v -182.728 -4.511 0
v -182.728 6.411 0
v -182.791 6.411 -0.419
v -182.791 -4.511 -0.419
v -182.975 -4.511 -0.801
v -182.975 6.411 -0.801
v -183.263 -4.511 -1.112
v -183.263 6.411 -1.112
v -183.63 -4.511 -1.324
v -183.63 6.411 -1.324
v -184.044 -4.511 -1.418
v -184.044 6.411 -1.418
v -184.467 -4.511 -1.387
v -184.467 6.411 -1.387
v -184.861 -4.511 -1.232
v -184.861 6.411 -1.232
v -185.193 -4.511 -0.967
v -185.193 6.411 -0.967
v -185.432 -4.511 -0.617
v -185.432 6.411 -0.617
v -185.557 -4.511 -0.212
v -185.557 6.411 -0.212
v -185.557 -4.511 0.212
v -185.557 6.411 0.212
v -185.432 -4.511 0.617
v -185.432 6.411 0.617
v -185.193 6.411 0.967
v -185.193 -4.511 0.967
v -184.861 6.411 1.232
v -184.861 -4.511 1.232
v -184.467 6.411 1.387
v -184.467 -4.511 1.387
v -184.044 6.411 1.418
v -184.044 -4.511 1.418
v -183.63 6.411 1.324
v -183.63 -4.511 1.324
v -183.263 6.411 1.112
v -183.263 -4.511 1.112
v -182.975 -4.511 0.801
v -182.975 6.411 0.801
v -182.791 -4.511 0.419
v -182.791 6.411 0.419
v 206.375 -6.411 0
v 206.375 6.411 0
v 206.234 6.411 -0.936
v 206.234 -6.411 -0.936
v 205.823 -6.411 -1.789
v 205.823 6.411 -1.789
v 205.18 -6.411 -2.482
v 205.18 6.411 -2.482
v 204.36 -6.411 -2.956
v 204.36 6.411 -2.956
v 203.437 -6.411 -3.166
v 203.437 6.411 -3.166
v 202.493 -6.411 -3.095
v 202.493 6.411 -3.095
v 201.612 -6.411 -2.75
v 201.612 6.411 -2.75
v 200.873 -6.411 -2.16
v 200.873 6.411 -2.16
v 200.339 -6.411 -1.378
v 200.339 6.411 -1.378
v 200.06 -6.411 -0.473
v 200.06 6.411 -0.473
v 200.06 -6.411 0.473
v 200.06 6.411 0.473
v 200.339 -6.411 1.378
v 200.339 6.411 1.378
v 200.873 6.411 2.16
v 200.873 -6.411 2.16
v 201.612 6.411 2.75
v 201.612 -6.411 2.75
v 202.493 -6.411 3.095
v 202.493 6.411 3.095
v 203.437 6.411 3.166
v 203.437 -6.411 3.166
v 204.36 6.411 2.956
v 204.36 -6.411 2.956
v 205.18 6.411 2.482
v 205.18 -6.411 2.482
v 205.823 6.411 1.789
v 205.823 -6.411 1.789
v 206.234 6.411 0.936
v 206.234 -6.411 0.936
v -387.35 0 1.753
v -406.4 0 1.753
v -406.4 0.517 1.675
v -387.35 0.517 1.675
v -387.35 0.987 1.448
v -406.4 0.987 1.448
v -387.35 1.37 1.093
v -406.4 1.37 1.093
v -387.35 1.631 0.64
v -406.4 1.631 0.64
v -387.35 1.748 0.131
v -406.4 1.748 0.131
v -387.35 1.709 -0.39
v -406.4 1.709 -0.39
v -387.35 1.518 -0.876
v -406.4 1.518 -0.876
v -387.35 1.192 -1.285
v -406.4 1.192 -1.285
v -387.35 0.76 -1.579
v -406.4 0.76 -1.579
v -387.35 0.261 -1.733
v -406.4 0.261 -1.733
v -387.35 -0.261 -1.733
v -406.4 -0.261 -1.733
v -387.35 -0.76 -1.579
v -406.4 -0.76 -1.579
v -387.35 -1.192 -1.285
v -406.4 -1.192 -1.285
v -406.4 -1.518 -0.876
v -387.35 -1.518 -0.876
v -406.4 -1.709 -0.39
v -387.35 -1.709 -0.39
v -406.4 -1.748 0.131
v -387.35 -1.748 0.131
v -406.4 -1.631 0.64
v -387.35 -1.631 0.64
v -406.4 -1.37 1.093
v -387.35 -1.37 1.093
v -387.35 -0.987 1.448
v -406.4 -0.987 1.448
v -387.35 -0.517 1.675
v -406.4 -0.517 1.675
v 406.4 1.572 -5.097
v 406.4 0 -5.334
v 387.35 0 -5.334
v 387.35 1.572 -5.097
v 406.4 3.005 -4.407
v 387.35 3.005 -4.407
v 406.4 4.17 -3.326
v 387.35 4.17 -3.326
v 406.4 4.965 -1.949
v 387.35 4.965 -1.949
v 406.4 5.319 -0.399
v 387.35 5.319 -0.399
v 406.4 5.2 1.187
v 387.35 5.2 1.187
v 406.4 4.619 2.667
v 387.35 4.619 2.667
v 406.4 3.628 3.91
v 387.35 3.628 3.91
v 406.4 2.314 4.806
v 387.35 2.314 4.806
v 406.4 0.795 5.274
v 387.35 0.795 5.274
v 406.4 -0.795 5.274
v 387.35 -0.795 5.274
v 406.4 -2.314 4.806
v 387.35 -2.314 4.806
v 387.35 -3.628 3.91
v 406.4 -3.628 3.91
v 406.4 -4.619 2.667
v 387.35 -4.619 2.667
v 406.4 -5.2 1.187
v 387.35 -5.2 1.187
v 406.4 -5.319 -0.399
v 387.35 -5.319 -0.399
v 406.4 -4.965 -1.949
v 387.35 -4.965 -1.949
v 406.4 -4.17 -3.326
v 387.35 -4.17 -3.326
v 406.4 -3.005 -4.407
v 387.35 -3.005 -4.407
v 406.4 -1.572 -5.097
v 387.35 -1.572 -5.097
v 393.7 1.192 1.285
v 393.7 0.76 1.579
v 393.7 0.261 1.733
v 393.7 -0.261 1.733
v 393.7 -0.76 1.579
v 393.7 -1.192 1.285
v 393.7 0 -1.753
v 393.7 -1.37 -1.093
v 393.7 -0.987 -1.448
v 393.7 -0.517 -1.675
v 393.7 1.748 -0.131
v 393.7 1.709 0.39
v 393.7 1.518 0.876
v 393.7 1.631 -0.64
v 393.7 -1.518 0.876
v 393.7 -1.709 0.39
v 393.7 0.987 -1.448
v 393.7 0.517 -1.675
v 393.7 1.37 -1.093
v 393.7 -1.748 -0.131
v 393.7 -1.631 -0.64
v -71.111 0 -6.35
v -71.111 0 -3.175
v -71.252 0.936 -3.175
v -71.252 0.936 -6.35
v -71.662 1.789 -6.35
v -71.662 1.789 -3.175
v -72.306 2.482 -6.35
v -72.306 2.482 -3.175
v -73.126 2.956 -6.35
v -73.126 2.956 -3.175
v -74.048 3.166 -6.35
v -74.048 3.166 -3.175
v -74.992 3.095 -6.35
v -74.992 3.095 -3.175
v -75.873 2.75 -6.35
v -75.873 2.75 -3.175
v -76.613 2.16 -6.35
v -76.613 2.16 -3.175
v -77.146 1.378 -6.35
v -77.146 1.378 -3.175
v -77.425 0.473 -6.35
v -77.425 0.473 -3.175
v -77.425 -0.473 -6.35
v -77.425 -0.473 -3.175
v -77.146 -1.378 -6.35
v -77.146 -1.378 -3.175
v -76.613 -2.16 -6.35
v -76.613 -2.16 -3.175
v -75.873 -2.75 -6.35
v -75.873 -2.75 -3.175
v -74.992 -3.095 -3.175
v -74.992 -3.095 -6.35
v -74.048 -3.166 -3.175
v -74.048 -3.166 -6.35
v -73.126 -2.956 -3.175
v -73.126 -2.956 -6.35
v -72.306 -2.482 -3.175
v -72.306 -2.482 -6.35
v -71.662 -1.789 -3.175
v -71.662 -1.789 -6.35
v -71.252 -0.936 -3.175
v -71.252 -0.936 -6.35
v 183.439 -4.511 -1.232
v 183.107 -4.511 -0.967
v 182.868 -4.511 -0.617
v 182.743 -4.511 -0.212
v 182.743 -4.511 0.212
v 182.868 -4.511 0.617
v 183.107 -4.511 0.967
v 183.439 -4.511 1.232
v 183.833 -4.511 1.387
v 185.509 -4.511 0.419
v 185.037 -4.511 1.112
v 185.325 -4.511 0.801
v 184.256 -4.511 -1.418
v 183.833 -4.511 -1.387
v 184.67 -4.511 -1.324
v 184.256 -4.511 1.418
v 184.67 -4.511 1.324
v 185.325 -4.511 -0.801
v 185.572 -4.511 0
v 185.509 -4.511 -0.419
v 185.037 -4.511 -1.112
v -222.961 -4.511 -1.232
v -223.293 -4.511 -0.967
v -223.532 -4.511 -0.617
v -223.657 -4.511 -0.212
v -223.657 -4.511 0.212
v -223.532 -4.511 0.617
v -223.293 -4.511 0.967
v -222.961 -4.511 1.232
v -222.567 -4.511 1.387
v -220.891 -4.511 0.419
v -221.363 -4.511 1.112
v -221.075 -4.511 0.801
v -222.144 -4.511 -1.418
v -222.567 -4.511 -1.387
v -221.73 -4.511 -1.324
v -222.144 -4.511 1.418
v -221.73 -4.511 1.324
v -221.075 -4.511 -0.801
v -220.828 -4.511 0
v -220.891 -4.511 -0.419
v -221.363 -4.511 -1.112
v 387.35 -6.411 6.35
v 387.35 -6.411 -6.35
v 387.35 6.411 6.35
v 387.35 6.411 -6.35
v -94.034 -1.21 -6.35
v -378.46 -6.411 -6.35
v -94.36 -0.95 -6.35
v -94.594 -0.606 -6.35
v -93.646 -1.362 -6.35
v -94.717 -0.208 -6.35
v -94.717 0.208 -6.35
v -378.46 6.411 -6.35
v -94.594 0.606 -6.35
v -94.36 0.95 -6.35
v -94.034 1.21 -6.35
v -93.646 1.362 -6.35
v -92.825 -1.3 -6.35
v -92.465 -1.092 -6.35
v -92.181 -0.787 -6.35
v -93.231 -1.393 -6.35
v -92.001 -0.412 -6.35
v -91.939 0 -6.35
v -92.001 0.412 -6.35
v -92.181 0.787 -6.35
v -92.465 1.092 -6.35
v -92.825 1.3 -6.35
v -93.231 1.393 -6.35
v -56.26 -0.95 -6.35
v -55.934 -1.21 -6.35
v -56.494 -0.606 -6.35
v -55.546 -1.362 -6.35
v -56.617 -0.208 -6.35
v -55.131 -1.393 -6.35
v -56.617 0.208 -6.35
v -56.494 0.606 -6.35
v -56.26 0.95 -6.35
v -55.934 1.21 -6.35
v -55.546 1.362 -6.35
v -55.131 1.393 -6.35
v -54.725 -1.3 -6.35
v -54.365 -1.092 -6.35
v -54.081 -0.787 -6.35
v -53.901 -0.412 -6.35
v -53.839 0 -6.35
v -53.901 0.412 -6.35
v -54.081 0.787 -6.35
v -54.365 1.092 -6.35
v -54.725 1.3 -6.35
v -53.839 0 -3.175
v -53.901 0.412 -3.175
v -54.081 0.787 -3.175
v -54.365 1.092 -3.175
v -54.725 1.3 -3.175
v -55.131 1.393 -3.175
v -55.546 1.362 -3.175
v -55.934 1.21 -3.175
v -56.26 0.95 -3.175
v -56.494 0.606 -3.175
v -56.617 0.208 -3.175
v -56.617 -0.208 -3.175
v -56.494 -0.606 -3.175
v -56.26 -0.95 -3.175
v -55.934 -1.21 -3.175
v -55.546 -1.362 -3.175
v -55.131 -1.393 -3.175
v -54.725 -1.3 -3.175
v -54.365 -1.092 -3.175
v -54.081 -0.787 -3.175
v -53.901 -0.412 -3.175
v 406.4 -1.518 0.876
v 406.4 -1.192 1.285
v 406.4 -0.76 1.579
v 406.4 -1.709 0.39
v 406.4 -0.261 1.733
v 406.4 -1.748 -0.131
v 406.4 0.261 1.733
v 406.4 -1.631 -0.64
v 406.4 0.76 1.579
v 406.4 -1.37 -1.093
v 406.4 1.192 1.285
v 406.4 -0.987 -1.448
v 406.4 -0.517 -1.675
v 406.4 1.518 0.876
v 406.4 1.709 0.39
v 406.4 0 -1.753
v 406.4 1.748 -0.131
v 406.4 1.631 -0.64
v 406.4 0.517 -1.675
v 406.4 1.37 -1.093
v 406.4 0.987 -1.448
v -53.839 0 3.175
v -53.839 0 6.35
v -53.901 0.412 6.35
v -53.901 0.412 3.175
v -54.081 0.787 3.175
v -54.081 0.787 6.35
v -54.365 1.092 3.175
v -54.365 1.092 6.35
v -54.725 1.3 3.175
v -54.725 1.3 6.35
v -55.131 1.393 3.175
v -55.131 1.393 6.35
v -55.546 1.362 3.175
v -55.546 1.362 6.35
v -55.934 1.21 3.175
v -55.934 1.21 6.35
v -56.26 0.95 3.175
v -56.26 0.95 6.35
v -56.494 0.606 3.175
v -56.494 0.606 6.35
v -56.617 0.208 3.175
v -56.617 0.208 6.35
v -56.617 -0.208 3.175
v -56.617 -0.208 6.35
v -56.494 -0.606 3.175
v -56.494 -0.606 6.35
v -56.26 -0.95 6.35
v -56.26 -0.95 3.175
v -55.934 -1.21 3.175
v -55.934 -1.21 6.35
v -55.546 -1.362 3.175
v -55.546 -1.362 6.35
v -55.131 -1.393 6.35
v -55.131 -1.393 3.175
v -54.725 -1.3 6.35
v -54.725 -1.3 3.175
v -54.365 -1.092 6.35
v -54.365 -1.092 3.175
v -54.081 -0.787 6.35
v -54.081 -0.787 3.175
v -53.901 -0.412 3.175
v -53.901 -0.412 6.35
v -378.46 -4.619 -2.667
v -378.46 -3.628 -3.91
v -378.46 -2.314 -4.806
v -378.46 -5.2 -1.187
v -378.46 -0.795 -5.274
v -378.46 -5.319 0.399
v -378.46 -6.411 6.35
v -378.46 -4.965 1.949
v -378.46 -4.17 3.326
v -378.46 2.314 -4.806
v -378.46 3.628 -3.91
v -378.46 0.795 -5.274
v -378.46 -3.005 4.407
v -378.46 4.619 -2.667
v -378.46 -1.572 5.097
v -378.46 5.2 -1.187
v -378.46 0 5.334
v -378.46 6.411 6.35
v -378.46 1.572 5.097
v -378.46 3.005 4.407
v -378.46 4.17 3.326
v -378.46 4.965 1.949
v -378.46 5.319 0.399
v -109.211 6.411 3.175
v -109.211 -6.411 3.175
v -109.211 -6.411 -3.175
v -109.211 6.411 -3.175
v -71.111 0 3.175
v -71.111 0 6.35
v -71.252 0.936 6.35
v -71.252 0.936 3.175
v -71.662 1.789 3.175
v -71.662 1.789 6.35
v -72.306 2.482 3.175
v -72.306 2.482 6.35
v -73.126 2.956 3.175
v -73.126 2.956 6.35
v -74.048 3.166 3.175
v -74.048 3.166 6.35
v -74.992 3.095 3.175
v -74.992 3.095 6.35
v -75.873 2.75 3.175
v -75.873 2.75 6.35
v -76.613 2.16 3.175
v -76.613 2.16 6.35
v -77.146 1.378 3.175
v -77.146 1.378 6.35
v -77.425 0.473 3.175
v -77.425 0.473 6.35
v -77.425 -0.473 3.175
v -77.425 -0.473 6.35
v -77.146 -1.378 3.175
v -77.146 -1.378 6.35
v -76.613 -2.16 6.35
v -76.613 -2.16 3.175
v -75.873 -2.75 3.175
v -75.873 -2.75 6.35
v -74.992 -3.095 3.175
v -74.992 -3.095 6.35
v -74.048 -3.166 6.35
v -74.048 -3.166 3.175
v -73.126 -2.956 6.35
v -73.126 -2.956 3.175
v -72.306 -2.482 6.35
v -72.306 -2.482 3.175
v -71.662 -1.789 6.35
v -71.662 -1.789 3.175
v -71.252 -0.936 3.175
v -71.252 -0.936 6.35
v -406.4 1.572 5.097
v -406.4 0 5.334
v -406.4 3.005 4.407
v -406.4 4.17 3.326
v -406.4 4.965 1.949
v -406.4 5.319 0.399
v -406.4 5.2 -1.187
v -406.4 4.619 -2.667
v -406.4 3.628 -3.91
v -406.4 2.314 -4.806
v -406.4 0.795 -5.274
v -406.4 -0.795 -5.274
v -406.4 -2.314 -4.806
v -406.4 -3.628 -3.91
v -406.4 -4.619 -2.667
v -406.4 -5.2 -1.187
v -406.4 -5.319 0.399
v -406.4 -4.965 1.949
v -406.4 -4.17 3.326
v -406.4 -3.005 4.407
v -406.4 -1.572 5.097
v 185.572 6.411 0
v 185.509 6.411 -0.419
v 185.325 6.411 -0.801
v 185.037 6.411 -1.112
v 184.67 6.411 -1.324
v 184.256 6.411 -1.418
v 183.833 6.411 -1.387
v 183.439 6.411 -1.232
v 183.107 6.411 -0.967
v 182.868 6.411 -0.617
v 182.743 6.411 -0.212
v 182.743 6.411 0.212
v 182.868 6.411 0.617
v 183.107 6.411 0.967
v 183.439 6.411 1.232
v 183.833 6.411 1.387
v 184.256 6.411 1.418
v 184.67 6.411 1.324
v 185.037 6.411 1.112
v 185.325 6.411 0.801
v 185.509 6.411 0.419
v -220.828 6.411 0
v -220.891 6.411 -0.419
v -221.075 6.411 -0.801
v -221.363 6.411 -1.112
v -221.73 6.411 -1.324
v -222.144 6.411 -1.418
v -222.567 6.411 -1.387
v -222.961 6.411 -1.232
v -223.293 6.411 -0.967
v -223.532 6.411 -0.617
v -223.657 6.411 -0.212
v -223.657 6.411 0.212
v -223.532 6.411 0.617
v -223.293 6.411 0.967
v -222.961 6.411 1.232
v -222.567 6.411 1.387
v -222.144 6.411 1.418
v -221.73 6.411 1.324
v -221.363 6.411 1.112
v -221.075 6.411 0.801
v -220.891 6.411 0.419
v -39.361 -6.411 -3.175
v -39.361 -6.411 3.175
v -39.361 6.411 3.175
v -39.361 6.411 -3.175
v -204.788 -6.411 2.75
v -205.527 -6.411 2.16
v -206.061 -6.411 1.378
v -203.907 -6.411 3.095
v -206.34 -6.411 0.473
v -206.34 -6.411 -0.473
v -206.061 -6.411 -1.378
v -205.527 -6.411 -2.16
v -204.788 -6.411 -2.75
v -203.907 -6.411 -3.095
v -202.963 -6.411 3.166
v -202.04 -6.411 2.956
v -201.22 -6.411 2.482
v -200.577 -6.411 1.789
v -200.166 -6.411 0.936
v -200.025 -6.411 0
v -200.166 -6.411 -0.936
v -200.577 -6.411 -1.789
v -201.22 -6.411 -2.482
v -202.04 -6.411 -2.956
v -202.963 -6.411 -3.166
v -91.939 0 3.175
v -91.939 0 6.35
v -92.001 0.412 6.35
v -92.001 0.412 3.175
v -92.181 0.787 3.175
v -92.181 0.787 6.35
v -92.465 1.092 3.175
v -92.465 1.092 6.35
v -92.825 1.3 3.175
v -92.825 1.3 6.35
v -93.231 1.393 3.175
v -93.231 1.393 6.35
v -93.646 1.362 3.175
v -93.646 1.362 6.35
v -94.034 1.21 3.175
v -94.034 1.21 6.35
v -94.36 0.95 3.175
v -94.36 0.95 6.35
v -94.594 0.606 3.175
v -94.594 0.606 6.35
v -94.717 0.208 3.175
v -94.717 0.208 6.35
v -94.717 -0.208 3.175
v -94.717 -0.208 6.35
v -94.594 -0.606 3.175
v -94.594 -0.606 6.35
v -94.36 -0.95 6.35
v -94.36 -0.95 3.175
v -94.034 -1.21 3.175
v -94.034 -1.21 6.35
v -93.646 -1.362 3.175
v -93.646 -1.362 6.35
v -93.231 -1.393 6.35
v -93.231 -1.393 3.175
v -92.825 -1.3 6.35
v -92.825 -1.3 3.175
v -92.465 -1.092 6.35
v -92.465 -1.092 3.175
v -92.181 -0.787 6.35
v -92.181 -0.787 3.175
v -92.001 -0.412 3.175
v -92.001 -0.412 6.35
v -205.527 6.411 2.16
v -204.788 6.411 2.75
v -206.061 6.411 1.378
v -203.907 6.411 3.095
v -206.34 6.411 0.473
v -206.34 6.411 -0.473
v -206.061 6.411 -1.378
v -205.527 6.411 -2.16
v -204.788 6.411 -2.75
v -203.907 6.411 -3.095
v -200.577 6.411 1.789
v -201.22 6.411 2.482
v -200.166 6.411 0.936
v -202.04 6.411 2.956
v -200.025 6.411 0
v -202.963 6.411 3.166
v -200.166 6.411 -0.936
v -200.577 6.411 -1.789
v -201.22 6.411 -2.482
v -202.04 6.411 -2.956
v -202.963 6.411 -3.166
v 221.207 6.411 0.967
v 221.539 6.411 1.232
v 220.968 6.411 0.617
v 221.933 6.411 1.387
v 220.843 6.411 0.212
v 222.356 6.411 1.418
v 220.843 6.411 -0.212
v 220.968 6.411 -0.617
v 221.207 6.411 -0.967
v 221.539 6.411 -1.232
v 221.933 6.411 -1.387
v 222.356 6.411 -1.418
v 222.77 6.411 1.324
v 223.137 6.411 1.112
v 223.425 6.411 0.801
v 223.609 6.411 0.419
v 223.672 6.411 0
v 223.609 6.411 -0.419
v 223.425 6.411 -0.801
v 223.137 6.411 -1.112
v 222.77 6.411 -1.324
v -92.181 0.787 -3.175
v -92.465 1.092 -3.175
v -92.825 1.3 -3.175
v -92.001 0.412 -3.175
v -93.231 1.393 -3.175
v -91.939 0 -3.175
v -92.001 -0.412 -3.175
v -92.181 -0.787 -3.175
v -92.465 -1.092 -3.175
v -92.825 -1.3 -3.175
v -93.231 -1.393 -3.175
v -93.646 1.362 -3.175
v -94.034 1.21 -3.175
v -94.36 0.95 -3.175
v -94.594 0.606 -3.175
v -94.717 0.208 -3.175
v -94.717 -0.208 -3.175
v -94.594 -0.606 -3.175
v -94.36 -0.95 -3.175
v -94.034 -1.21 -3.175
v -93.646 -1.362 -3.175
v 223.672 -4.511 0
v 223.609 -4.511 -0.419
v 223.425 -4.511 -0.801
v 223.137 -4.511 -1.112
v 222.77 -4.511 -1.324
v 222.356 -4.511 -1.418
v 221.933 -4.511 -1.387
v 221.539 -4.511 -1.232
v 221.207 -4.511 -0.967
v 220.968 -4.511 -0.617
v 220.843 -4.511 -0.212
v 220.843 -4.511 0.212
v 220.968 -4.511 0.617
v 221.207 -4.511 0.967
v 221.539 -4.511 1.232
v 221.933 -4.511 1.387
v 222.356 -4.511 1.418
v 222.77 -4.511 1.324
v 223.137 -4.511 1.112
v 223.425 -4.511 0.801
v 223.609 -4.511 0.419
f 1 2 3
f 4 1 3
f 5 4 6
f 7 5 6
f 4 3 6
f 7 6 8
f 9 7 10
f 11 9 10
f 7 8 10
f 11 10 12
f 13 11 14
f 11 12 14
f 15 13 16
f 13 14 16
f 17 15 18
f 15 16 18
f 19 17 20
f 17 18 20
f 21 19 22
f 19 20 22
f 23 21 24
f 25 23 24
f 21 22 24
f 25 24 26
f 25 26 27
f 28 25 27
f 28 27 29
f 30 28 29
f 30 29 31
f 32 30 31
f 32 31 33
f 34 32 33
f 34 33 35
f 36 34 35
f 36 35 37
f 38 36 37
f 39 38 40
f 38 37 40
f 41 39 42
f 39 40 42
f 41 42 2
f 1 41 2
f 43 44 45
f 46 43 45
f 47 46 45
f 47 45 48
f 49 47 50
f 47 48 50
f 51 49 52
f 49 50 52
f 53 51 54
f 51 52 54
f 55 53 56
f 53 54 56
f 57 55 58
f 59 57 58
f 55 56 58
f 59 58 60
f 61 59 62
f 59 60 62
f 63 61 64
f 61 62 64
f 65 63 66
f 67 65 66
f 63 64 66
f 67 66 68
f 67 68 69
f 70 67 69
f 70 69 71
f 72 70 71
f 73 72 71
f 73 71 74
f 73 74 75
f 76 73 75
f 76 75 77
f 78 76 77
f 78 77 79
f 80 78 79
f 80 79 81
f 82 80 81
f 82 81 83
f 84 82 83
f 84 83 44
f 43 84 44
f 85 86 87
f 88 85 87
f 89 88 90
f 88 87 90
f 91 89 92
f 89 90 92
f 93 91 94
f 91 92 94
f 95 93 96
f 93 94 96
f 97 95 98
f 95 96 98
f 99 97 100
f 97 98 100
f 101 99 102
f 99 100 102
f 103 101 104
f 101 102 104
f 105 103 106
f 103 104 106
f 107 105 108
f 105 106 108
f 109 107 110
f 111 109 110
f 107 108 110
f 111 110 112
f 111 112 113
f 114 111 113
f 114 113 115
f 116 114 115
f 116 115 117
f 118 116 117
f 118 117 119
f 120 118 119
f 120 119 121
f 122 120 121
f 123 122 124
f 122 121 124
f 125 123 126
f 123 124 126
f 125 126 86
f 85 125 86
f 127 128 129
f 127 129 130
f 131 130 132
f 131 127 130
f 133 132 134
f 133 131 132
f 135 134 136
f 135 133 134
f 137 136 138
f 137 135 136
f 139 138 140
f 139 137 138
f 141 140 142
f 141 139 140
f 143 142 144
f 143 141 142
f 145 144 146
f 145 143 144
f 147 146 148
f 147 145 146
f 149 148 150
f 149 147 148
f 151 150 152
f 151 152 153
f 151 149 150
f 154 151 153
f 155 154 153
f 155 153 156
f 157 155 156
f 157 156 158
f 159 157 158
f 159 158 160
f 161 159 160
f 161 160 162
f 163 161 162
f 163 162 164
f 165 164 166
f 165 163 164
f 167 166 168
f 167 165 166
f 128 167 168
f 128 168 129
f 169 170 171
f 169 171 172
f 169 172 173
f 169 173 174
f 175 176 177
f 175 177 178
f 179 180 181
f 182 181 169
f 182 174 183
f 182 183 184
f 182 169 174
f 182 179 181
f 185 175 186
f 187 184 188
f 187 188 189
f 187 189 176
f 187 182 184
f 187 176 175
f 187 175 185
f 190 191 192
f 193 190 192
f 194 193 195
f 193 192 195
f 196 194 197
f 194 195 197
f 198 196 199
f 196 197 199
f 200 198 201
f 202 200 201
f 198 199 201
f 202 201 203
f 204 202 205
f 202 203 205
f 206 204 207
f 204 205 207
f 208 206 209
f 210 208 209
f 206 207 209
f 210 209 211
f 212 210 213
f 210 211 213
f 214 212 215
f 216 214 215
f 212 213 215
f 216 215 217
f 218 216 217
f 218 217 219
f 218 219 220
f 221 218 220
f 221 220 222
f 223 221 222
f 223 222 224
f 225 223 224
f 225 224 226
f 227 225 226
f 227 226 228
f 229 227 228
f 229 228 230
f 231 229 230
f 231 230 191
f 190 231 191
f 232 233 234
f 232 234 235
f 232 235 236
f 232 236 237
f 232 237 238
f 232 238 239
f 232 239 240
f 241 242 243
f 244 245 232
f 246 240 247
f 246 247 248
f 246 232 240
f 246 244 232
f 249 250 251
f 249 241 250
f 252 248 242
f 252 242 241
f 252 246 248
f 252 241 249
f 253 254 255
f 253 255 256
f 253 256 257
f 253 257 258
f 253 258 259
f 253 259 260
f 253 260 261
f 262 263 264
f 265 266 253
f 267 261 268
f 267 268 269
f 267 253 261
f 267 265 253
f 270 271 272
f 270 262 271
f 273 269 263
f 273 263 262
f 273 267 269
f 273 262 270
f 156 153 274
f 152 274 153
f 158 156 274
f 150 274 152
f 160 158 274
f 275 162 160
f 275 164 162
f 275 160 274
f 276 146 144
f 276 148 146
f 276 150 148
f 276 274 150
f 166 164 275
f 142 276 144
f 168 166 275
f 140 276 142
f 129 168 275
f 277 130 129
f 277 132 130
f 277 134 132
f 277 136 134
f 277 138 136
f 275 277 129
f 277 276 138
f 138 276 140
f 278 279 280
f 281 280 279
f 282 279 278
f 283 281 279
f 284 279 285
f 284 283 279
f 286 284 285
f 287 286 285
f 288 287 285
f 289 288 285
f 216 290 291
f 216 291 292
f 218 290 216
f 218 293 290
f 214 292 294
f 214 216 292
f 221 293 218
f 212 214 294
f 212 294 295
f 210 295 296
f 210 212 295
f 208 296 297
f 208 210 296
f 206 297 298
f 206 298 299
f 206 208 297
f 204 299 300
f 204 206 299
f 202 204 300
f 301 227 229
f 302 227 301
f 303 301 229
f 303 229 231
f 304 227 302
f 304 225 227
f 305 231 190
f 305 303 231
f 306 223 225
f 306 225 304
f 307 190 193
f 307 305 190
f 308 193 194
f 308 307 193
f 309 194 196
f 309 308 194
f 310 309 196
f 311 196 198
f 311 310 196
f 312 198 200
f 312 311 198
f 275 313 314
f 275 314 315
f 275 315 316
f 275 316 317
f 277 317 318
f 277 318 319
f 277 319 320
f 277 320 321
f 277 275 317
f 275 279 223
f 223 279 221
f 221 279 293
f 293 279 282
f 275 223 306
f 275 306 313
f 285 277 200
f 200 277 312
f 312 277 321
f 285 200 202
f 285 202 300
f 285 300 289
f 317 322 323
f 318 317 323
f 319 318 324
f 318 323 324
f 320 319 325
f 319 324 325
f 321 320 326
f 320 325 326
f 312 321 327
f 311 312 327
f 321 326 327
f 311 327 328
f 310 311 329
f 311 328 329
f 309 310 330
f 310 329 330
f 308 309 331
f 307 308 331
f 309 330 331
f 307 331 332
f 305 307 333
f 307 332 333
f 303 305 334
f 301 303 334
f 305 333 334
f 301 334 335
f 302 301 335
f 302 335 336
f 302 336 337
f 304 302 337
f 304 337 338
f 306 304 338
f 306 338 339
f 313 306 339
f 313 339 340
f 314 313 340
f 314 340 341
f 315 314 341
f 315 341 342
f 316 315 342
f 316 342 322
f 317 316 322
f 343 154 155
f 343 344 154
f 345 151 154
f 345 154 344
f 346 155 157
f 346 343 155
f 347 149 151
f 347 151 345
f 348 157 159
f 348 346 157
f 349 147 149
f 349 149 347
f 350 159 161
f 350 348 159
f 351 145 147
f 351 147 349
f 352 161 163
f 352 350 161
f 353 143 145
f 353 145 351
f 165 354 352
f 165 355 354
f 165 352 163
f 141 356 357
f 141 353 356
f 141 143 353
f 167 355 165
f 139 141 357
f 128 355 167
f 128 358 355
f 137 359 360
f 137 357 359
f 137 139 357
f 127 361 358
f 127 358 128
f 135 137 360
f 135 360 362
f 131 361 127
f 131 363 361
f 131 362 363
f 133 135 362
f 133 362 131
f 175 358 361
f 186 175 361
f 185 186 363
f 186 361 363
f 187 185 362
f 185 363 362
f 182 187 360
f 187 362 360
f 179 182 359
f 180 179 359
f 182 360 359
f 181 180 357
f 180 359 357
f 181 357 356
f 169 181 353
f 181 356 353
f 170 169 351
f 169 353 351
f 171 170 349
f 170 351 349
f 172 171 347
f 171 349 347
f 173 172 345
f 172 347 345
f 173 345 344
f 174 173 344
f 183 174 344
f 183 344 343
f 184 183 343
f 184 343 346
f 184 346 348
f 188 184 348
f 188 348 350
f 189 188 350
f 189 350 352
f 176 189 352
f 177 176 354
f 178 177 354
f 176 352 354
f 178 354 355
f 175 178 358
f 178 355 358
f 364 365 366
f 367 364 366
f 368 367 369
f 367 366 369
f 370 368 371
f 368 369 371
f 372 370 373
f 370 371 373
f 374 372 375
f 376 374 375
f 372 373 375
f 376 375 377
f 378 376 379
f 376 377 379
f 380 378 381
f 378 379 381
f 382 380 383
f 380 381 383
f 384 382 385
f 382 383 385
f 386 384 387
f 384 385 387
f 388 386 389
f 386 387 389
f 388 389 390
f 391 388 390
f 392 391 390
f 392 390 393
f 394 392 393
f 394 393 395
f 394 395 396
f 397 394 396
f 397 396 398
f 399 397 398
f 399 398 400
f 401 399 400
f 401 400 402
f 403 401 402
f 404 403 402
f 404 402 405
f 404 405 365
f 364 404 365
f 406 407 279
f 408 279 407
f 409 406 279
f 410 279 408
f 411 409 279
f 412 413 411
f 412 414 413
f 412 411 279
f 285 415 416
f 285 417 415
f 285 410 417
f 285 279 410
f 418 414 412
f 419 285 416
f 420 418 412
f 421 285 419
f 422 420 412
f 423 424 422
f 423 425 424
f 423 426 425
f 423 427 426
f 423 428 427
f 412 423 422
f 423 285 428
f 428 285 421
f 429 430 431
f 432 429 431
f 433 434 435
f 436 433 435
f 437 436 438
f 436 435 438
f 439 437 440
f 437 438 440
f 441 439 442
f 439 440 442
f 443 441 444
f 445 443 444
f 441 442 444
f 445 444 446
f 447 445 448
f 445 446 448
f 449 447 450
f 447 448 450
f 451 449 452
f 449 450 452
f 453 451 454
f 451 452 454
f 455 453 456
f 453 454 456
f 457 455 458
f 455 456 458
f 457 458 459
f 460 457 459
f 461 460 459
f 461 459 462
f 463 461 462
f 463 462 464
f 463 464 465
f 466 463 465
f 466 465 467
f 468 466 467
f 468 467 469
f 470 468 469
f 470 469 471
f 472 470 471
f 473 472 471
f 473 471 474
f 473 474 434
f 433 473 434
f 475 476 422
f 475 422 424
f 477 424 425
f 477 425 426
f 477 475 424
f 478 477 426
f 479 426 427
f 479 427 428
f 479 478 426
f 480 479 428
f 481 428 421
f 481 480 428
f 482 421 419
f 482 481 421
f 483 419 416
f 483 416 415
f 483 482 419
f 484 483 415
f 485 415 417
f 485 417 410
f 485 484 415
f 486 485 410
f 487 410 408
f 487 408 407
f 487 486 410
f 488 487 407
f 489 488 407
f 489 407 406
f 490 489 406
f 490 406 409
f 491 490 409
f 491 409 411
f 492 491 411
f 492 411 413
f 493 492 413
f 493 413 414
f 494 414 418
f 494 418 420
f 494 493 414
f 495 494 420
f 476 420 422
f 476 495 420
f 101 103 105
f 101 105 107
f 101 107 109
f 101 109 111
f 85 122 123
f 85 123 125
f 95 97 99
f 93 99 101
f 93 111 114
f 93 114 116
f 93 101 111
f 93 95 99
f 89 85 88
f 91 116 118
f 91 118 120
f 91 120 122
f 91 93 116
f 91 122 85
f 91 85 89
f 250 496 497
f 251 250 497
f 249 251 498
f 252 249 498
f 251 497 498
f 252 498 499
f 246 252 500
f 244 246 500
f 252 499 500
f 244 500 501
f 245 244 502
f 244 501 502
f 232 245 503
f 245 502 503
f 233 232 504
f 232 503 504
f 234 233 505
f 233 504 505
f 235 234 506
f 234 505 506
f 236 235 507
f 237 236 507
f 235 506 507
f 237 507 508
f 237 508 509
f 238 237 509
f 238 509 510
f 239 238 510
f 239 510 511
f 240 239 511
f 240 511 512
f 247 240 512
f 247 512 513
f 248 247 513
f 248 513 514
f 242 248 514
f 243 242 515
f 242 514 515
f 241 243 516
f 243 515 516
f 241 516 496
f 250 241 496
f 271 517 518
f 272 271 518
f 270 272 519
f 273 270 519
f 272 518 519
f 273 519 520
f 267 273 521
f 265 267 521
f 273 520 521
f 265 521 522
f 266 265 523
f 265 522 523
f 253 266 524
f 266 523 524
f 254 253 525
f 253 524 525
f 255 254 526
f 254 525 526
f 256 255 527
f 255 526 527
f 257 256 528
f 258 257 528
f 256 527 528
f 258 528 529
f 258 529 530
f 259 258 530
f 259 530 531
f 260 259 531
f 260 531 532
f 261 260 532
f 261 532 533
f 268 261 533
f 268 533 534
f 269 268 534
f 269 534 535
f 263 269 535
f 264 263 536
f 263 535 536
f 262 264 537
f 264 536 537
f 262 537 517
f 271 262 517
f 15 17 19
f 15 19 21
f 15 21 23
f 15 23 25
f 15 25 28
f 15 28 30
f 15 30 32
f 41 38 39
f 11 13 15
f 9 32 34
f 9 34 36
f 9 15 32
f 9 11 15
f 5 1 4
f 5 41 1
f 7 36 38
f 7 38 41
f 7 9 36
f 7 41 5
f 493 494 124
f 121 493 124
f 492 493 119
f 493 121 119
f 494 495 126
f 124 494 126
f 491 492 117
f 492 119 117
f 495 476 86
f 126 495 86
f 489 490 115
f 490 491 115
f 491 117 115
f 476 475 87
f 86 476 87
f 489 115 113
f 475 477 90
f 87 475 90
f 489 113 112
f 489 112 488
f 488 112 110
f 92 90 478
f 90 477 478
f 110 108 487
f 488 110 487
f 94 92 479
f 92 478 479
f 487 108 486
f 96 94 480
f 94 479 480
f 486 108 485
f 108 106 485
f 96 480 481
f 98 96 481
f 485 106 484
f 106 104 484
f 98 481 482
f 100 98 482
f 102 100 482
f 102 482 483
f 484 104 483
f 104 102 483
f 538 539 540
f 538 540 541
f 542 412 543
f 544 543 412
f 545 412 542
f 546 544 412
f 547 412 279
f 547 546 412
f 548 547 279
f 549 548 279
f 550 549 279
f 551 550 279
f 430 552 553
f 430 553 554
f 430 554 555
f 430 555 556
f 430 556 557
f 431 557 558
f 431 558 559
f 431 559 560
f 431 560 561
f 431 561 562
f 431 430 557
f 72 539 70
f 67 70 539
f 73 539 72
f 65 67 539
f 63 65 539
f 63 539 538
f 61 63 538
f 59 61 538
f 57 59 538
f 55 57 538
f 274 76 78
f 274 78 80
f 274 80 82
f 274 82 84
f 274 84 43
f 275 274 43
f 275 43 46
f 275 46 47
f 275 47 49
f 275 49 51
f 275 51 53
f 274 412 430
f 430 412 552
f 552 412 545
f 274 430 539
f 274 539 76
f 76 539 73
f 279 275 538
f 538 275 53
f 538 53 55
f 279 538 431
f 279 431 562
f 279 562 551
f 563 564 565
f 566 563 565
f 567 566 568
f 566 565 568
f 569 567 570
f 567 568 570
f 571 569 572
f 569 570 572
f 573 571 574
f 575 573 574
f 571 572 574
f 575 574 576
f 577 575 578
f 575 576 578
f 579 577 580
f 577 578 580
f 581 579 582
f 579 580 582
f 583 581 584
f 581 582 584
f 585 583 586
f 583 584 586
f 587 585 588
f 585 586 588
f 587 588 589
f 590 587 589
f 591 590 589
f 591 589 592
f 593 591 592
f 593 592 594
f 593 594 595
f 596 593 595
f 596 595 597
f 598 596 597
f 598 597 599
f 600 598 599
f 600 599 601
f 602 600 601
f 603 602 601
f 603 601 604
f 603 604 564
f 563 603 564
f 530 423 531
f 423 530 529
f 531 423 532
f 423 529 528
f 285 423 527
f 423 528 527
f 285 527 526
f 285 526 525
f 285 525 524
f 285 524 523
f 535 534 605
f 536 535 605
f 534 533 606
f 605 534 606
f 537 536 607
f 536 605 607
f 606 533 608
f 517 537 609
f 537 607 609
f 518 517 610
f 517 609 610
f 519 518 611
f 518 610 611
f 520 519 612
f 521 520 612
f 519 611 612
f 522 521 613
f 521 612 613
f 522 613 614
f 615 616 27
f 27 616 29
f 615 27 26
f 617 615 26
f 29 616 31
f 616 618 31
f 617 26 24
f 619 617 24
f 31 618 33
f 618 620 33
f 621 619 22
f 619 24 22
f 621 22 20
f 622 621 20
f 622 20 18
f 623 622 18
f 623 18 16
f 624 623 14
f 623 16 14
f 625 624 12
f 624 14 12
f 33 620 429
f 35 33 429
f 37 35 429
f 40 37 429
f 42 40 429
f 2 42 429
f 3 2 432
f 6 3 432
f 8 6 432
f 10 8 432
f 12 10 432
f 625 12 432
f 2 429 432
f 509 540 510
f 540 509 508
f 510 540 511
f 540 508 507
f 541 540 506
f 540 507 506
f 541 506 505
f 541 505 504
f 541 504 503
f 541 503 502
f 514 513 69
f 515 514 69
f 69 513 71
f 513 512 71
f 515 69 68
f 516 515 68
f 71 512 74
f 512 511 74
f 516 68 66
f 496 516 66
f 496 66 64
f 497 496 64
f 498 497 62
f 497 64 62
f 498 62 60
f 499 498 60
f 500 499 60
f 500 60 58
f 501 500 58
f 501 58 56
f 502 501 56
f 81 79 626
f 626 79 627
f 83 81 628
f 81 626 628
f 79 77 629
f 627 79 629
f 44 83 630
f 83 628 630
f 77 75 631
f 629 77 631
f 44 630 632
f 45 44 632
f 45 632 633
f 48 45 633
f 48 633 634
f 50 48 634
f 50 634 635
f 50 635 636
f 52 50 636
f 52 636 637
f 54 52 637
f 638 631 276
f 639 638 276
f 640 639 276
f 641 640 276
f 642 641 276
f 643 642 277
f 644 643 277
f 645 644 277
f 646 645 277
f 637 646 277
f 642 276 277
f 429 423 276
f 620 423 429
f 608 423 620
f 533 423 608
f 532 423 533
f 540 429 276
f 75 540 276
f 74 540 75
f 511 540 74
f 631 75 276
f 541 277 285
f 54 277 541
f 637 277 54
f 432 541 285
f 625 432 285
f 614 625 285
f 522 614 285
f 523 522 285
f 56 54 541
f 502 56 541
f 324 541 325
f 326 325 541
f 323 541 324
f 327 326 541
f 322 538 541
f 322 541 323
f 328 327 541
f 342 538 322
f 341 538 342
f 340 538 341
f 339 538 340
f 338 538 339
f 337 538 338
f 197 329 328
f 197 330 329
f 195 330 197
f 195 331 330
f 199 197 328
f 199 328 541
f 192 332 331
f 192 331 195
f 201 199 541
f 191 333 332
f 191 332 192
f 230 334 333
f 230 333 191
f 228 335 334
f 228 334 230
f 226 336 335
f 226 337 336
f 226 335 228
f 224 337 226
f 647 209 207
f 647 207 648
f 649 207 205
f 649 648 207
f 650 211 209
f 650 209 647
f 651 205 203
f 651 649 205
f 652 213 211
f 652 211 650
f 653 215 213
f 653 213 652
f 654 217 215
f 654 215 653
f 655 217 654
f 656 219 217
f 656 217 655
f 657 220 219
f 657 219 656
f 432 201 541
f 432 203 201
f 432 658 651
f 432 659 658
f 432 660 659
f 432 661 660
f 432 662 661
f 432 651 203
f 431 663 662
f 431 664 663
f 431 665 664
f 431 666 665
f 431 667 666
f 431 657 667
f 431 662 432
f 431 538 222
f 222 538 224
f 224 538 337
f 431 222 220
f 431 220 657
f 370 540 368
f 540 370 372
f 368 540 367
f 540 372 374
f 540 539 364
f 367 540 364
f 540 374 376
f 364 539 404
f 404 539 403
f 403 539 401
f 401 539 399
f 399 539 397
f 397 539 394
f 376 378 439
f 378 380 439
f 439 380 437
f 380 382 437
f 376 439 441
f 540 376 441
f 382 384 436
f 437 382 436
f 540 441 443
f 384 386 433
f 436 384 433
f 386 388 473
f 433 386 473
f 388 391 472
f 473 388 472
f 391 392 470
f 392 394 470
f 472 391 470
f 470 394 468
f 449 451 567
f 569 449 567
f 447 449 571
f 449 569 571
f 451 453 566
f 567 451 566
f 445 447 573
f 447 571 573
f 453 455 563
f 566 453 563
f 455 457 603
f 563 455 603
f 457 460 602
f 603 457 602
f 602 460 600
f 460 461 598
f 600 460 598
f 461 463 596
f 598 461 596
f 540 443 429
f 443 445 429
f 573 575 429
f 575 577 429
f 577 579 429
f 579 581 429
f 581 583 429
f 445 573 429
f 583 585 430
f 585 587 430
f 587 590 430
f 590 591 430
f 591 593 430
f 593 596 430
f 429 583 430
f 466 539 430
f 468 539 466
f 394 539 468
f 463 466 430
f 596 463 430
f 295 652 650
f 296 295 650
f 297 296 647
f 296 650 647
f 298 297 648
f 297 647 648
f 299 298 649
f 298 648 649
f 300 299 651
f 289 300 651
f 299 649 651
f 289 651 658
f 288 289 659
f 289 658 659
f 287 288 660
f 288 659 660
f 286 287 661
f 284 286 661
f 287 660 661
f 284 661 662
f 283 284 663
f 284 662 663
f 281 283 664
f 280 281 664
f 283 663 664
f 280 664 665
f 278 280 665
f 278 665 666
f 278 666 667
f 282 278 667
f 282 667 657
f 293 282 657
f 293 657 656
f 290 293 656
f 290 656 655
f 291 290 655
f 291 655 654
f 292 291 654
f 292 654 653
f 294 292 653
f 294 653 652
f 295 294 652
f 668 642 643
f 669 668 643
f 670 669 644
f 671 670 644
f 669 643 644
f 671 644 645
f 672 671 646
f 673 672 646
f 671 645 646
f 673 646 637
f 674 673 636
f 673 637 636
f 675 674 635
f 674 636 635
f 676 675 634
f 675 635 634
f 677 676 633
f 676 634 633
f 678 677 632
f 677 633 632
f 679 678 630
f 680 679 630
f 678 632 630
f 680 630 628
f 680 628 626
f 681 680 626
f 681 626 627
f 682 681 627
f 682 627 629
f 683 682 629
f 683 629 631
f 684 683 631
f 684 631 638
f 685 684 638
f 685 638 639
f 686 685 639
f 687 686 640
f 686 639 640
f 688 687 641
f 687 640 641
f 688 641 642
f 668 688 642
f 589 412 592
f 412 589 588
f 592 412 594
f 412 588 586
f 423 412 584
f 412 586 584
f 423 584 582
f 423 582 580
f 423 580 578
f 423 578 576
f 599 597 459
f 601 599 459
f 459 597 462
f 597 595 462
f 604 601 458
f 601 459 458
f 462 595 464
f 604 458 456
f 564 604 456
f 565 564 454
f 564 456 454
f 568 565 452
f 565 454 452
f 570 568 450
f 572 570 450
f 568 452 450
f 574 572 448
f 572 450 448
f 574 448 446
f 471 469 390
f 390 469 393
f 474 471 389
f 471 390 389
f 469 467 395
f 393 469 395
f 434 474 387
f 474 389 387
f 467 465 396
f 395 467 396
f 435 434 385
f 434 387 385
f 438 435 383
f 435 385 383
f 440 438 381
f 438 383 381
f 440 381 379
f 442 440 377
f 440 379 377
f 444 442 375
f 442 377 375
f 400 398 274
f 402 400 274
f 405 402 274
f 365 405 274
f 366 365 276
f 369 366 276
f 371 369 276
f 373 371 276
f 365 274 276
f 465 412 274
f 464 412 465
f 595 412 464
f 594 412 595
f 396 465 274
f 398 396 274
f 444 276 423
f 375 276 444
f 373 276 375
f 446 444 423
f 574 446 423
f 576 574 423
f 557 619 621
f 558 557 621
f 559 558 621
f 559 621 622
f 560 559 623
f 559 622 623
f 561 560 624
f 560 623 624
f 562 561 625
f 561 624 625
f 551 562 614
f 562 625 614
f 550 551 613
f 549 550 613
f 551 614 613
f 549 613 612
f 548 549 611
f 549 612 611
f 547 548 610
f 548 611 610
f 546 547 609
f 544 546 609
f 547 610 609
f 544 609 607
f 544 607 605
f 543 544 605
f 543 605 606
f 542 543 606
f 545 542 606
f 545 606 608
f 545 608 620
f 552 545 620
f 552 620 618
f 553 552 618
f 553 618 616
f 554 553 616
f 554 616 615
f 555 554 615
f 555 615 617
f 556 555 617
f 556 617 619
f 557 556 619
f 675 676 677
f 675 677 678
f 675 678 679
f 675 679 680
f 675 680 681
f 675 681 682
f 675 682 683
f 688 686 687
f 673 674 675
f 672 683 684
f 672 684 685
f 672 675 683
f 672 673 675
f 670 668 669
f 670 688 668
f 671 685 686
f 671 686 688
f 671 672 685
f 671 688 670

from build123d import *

# Parameters (mm, degrees)
SKETCH1_W                       = 12.7
SKETCH1_H                       = 12.82133758
LENGTH_DEPTH                    = 406.4
SKETCH2_W                       = 12.7
SKETCH2_H                       = 12.82133758
SKETCH2_R                       = 5.334
ROUND_CUT_1_DEPTH               = 19.05
SKETCH3_W                       = 12.7
SKETCH3_H                       = 12.82133758
SKETCH3_R                       = 5.334
ROUND_CUT_2_DEPTH               = 27.94
SKETCH14_R                      = 1.7526
CUT_EXTRUDE6_DEPTH              = 12.7
SKETCH15_R                      = 1.7526
CUT_EXTRUDE7_DEPTH              = 19.05
BOTTOM_WASHER_R                 = 1.4224
BOTTOM_WASHER_BOLTS_DEPTH       = 10.922
BOTTOM_WASHER_CENTER_BOLT_REACH = 14.821
SKETCH18_R                      = 3.175
TOP_WASHER_CENTER_BOLT_REACH    = 14.821
SKETCH17_R                      = 3.175
SKETCH16_R                      = 1.4224
TOP_WASHER_DEPTH                = 10.922
SKETCH19_W                      = 69.85
SKETCH19_H                      = 6.35
CUT_EXTRUDE8_DEPTH              = 13.82133758
SKETCH20_R                      = 1.397
SKETCH20_R_2                    = 3.175
CUT_EXTRUDE9_DEPTH              = 13.7


with BuildPart() as part:
    # Sketch1 → Length (new body, symmetric)
    with BuildSketch(Plane(origin=(0, 0, 0), x_dir=(0, 0, -1), z_dir=(1, 0, 0))):
        Rectangle(SKETCH1_W, SKETCH1_H)
    extrude(amount=LENGTH_DEPTH, both=True)

    # Sketch2 → Round Cut 1 (cut)
    with BuildSketch(Plane(origin=(406.4, 0, 0), x_dir=(0, 0, -1), z_dir=(1, 0, 0))):
        Rectangle(SKETCH2_W, SKETCH2_H)
        Circle(SKETCH2_R, mode=Mode.SUBTRACT)
    extrude(amount=-ROUND_CUT_1_DEPTH, mode=Mode.SUBTRACT)

    # Sketch3 → Round Cut 2 (cut)
    with BuildSketch(Plane.ZY.offset(406.4)):
        Rectangle(SKETCH3_W, SKETCH3_H)
        Circle(SKETCH3_R, mode=Mode.SUBTRACT)
    extrude(amount=-ROUND_CUT_2_DEPTH, mode=Mode.SUBTRACT)

    # Sketch14 → Cut-Extrude6 (cut)
    with BuildSketch(Plane(origin=(406.4, 0, 0), x_dir=(0, 0, -1), z_dir=(1, 0, 0))):
        Circle(SKETCH14_R)
    extrude(amount=-CUT_EXTRUDE6_DEPTH, mode=Mode.SUBTRACT)

    # Sketch15 → Cut-Extrude7 (cut)
    with BuildSketch(Plane.ZY.offset(406.4)):
        Circle(SKETCH15_R)
    extrude(amount=-CUT_EXTRUDE7_DEPTH, mode=Mode.SUBTRACT)

    # Bottom Washer → Bottom washer bolts (cut)
    with BuildSketch(Plane(origin=(0, 6.41066879, 0), x_dir=(1, 0, 0), z_dir=(0, 1, 0))):
        with Locations((-222.25, 0)):
            Circle(BOTTOM_WASHER_R)
        with Locations((-184.15, 0)):
            Circle(BOTTOM_WASHER_R)
    extrude(amount=-BOTTOM_WASHER_BOLTS_DEPTH, mode=Mode.SUBTRACT)

    # Sketch18 → Bottom Washer Center Bolt (cut, up to next)
    with BuildSketch(Plane(origin=(0, 6.41066879, 0), x_dir=(1, 0, 0), z_dir=(0, 1, 0)), mode=Mode.PRIVATE) as bottom_washer_center_bolt_sk1:
        with Locations((-203.2, 0)):
            Circle(SKETCH18_R)
    bottom_washer_center_bolt_tool1 = extrude(bottom_washer_center_bolt_sk1.sketch, amount=-BOTTOM_WASHER_CENTER_BOLT_REACH, mode=Mode.PRIVATE) & part.part
    add(bottom_washer_center_bolt_tool1.solids().sort_by_distance((-203.2, 6.410669, 0))[0], mode=Mode.SUBTRACT)

    # Sketch17 → Top Washer Center Bolt (cut, up to next)
    with BuildSketch(Plane(origin=(0, 6.41066879, 0), x_dir=(1, 0, 0), z_dir=(0, 1, 0)), mode=Mode.PRIVATE) as top_washer_center_bolt_sk1:
        with Locations((203.2, 0)):
            Circle(SKETCH17_R)
    top_washer_center_bolt_tool1 = extrude(top_washer_center_bolt_sk1.sketch, amount=-TOP_WASHER_CENTER_BOLT_REACH, mode=Mode.PRIVATE) & part.part
    add(top_washer_center_bolt_tool1.solids().sort_by_distance((203.2, 6.410669, 0))[0], mode=Mode.SUBTRACT)

    # Sketch16 → Top Washer (cut)
    with BuildSketch(Plane(origin=(0, 6.41066879, 0), x_dir=(1, 0, 0), z_dir=(0, 1, 0))):
        with Locations((222.25, 0)):
            Circle(SKETCH16_R)
        with Locations((184.15, 0)):
            Circle(SKETCH16_R)
    extrude(amount=-TOP_WASHER_DEPTH, mode=Mode.SUBTRACT)

    # Sketch19 → Cut-Extrude8 (cut, through all)
    with BuildSketch(Plane(origin=(0, -6.41066879, 0), x_dir=(-1, 0, 0), z_dir=(0, -1, 0))):
        with Locations((74.285606639, 0)):
            Rectangle(SKETCH19_W, SKETCH19_H)
    extrude(amount=-CUT_EXTRUDE8_DEPTH, mode=Mode.SUBTRACT)

    # Sketch20 → Cut-Extrude9 (cut, through all)
    with BuildSketch(Plane.XY.offset(6.35)):
        with Locations((-93.335606639, 0)):
            Circle(SKETCH20_R)
        with Locations((-74.285606639, 0)):
            Circle(SKETCH20_R_2)
        with Locations((-55.235606639, 0)):
            Circle(SKETCH20_R)
    extrude(amount=-CUT_EXTRUDE9_DEPTH, mode=Mode.SUBTRACT)


solid = part.part
